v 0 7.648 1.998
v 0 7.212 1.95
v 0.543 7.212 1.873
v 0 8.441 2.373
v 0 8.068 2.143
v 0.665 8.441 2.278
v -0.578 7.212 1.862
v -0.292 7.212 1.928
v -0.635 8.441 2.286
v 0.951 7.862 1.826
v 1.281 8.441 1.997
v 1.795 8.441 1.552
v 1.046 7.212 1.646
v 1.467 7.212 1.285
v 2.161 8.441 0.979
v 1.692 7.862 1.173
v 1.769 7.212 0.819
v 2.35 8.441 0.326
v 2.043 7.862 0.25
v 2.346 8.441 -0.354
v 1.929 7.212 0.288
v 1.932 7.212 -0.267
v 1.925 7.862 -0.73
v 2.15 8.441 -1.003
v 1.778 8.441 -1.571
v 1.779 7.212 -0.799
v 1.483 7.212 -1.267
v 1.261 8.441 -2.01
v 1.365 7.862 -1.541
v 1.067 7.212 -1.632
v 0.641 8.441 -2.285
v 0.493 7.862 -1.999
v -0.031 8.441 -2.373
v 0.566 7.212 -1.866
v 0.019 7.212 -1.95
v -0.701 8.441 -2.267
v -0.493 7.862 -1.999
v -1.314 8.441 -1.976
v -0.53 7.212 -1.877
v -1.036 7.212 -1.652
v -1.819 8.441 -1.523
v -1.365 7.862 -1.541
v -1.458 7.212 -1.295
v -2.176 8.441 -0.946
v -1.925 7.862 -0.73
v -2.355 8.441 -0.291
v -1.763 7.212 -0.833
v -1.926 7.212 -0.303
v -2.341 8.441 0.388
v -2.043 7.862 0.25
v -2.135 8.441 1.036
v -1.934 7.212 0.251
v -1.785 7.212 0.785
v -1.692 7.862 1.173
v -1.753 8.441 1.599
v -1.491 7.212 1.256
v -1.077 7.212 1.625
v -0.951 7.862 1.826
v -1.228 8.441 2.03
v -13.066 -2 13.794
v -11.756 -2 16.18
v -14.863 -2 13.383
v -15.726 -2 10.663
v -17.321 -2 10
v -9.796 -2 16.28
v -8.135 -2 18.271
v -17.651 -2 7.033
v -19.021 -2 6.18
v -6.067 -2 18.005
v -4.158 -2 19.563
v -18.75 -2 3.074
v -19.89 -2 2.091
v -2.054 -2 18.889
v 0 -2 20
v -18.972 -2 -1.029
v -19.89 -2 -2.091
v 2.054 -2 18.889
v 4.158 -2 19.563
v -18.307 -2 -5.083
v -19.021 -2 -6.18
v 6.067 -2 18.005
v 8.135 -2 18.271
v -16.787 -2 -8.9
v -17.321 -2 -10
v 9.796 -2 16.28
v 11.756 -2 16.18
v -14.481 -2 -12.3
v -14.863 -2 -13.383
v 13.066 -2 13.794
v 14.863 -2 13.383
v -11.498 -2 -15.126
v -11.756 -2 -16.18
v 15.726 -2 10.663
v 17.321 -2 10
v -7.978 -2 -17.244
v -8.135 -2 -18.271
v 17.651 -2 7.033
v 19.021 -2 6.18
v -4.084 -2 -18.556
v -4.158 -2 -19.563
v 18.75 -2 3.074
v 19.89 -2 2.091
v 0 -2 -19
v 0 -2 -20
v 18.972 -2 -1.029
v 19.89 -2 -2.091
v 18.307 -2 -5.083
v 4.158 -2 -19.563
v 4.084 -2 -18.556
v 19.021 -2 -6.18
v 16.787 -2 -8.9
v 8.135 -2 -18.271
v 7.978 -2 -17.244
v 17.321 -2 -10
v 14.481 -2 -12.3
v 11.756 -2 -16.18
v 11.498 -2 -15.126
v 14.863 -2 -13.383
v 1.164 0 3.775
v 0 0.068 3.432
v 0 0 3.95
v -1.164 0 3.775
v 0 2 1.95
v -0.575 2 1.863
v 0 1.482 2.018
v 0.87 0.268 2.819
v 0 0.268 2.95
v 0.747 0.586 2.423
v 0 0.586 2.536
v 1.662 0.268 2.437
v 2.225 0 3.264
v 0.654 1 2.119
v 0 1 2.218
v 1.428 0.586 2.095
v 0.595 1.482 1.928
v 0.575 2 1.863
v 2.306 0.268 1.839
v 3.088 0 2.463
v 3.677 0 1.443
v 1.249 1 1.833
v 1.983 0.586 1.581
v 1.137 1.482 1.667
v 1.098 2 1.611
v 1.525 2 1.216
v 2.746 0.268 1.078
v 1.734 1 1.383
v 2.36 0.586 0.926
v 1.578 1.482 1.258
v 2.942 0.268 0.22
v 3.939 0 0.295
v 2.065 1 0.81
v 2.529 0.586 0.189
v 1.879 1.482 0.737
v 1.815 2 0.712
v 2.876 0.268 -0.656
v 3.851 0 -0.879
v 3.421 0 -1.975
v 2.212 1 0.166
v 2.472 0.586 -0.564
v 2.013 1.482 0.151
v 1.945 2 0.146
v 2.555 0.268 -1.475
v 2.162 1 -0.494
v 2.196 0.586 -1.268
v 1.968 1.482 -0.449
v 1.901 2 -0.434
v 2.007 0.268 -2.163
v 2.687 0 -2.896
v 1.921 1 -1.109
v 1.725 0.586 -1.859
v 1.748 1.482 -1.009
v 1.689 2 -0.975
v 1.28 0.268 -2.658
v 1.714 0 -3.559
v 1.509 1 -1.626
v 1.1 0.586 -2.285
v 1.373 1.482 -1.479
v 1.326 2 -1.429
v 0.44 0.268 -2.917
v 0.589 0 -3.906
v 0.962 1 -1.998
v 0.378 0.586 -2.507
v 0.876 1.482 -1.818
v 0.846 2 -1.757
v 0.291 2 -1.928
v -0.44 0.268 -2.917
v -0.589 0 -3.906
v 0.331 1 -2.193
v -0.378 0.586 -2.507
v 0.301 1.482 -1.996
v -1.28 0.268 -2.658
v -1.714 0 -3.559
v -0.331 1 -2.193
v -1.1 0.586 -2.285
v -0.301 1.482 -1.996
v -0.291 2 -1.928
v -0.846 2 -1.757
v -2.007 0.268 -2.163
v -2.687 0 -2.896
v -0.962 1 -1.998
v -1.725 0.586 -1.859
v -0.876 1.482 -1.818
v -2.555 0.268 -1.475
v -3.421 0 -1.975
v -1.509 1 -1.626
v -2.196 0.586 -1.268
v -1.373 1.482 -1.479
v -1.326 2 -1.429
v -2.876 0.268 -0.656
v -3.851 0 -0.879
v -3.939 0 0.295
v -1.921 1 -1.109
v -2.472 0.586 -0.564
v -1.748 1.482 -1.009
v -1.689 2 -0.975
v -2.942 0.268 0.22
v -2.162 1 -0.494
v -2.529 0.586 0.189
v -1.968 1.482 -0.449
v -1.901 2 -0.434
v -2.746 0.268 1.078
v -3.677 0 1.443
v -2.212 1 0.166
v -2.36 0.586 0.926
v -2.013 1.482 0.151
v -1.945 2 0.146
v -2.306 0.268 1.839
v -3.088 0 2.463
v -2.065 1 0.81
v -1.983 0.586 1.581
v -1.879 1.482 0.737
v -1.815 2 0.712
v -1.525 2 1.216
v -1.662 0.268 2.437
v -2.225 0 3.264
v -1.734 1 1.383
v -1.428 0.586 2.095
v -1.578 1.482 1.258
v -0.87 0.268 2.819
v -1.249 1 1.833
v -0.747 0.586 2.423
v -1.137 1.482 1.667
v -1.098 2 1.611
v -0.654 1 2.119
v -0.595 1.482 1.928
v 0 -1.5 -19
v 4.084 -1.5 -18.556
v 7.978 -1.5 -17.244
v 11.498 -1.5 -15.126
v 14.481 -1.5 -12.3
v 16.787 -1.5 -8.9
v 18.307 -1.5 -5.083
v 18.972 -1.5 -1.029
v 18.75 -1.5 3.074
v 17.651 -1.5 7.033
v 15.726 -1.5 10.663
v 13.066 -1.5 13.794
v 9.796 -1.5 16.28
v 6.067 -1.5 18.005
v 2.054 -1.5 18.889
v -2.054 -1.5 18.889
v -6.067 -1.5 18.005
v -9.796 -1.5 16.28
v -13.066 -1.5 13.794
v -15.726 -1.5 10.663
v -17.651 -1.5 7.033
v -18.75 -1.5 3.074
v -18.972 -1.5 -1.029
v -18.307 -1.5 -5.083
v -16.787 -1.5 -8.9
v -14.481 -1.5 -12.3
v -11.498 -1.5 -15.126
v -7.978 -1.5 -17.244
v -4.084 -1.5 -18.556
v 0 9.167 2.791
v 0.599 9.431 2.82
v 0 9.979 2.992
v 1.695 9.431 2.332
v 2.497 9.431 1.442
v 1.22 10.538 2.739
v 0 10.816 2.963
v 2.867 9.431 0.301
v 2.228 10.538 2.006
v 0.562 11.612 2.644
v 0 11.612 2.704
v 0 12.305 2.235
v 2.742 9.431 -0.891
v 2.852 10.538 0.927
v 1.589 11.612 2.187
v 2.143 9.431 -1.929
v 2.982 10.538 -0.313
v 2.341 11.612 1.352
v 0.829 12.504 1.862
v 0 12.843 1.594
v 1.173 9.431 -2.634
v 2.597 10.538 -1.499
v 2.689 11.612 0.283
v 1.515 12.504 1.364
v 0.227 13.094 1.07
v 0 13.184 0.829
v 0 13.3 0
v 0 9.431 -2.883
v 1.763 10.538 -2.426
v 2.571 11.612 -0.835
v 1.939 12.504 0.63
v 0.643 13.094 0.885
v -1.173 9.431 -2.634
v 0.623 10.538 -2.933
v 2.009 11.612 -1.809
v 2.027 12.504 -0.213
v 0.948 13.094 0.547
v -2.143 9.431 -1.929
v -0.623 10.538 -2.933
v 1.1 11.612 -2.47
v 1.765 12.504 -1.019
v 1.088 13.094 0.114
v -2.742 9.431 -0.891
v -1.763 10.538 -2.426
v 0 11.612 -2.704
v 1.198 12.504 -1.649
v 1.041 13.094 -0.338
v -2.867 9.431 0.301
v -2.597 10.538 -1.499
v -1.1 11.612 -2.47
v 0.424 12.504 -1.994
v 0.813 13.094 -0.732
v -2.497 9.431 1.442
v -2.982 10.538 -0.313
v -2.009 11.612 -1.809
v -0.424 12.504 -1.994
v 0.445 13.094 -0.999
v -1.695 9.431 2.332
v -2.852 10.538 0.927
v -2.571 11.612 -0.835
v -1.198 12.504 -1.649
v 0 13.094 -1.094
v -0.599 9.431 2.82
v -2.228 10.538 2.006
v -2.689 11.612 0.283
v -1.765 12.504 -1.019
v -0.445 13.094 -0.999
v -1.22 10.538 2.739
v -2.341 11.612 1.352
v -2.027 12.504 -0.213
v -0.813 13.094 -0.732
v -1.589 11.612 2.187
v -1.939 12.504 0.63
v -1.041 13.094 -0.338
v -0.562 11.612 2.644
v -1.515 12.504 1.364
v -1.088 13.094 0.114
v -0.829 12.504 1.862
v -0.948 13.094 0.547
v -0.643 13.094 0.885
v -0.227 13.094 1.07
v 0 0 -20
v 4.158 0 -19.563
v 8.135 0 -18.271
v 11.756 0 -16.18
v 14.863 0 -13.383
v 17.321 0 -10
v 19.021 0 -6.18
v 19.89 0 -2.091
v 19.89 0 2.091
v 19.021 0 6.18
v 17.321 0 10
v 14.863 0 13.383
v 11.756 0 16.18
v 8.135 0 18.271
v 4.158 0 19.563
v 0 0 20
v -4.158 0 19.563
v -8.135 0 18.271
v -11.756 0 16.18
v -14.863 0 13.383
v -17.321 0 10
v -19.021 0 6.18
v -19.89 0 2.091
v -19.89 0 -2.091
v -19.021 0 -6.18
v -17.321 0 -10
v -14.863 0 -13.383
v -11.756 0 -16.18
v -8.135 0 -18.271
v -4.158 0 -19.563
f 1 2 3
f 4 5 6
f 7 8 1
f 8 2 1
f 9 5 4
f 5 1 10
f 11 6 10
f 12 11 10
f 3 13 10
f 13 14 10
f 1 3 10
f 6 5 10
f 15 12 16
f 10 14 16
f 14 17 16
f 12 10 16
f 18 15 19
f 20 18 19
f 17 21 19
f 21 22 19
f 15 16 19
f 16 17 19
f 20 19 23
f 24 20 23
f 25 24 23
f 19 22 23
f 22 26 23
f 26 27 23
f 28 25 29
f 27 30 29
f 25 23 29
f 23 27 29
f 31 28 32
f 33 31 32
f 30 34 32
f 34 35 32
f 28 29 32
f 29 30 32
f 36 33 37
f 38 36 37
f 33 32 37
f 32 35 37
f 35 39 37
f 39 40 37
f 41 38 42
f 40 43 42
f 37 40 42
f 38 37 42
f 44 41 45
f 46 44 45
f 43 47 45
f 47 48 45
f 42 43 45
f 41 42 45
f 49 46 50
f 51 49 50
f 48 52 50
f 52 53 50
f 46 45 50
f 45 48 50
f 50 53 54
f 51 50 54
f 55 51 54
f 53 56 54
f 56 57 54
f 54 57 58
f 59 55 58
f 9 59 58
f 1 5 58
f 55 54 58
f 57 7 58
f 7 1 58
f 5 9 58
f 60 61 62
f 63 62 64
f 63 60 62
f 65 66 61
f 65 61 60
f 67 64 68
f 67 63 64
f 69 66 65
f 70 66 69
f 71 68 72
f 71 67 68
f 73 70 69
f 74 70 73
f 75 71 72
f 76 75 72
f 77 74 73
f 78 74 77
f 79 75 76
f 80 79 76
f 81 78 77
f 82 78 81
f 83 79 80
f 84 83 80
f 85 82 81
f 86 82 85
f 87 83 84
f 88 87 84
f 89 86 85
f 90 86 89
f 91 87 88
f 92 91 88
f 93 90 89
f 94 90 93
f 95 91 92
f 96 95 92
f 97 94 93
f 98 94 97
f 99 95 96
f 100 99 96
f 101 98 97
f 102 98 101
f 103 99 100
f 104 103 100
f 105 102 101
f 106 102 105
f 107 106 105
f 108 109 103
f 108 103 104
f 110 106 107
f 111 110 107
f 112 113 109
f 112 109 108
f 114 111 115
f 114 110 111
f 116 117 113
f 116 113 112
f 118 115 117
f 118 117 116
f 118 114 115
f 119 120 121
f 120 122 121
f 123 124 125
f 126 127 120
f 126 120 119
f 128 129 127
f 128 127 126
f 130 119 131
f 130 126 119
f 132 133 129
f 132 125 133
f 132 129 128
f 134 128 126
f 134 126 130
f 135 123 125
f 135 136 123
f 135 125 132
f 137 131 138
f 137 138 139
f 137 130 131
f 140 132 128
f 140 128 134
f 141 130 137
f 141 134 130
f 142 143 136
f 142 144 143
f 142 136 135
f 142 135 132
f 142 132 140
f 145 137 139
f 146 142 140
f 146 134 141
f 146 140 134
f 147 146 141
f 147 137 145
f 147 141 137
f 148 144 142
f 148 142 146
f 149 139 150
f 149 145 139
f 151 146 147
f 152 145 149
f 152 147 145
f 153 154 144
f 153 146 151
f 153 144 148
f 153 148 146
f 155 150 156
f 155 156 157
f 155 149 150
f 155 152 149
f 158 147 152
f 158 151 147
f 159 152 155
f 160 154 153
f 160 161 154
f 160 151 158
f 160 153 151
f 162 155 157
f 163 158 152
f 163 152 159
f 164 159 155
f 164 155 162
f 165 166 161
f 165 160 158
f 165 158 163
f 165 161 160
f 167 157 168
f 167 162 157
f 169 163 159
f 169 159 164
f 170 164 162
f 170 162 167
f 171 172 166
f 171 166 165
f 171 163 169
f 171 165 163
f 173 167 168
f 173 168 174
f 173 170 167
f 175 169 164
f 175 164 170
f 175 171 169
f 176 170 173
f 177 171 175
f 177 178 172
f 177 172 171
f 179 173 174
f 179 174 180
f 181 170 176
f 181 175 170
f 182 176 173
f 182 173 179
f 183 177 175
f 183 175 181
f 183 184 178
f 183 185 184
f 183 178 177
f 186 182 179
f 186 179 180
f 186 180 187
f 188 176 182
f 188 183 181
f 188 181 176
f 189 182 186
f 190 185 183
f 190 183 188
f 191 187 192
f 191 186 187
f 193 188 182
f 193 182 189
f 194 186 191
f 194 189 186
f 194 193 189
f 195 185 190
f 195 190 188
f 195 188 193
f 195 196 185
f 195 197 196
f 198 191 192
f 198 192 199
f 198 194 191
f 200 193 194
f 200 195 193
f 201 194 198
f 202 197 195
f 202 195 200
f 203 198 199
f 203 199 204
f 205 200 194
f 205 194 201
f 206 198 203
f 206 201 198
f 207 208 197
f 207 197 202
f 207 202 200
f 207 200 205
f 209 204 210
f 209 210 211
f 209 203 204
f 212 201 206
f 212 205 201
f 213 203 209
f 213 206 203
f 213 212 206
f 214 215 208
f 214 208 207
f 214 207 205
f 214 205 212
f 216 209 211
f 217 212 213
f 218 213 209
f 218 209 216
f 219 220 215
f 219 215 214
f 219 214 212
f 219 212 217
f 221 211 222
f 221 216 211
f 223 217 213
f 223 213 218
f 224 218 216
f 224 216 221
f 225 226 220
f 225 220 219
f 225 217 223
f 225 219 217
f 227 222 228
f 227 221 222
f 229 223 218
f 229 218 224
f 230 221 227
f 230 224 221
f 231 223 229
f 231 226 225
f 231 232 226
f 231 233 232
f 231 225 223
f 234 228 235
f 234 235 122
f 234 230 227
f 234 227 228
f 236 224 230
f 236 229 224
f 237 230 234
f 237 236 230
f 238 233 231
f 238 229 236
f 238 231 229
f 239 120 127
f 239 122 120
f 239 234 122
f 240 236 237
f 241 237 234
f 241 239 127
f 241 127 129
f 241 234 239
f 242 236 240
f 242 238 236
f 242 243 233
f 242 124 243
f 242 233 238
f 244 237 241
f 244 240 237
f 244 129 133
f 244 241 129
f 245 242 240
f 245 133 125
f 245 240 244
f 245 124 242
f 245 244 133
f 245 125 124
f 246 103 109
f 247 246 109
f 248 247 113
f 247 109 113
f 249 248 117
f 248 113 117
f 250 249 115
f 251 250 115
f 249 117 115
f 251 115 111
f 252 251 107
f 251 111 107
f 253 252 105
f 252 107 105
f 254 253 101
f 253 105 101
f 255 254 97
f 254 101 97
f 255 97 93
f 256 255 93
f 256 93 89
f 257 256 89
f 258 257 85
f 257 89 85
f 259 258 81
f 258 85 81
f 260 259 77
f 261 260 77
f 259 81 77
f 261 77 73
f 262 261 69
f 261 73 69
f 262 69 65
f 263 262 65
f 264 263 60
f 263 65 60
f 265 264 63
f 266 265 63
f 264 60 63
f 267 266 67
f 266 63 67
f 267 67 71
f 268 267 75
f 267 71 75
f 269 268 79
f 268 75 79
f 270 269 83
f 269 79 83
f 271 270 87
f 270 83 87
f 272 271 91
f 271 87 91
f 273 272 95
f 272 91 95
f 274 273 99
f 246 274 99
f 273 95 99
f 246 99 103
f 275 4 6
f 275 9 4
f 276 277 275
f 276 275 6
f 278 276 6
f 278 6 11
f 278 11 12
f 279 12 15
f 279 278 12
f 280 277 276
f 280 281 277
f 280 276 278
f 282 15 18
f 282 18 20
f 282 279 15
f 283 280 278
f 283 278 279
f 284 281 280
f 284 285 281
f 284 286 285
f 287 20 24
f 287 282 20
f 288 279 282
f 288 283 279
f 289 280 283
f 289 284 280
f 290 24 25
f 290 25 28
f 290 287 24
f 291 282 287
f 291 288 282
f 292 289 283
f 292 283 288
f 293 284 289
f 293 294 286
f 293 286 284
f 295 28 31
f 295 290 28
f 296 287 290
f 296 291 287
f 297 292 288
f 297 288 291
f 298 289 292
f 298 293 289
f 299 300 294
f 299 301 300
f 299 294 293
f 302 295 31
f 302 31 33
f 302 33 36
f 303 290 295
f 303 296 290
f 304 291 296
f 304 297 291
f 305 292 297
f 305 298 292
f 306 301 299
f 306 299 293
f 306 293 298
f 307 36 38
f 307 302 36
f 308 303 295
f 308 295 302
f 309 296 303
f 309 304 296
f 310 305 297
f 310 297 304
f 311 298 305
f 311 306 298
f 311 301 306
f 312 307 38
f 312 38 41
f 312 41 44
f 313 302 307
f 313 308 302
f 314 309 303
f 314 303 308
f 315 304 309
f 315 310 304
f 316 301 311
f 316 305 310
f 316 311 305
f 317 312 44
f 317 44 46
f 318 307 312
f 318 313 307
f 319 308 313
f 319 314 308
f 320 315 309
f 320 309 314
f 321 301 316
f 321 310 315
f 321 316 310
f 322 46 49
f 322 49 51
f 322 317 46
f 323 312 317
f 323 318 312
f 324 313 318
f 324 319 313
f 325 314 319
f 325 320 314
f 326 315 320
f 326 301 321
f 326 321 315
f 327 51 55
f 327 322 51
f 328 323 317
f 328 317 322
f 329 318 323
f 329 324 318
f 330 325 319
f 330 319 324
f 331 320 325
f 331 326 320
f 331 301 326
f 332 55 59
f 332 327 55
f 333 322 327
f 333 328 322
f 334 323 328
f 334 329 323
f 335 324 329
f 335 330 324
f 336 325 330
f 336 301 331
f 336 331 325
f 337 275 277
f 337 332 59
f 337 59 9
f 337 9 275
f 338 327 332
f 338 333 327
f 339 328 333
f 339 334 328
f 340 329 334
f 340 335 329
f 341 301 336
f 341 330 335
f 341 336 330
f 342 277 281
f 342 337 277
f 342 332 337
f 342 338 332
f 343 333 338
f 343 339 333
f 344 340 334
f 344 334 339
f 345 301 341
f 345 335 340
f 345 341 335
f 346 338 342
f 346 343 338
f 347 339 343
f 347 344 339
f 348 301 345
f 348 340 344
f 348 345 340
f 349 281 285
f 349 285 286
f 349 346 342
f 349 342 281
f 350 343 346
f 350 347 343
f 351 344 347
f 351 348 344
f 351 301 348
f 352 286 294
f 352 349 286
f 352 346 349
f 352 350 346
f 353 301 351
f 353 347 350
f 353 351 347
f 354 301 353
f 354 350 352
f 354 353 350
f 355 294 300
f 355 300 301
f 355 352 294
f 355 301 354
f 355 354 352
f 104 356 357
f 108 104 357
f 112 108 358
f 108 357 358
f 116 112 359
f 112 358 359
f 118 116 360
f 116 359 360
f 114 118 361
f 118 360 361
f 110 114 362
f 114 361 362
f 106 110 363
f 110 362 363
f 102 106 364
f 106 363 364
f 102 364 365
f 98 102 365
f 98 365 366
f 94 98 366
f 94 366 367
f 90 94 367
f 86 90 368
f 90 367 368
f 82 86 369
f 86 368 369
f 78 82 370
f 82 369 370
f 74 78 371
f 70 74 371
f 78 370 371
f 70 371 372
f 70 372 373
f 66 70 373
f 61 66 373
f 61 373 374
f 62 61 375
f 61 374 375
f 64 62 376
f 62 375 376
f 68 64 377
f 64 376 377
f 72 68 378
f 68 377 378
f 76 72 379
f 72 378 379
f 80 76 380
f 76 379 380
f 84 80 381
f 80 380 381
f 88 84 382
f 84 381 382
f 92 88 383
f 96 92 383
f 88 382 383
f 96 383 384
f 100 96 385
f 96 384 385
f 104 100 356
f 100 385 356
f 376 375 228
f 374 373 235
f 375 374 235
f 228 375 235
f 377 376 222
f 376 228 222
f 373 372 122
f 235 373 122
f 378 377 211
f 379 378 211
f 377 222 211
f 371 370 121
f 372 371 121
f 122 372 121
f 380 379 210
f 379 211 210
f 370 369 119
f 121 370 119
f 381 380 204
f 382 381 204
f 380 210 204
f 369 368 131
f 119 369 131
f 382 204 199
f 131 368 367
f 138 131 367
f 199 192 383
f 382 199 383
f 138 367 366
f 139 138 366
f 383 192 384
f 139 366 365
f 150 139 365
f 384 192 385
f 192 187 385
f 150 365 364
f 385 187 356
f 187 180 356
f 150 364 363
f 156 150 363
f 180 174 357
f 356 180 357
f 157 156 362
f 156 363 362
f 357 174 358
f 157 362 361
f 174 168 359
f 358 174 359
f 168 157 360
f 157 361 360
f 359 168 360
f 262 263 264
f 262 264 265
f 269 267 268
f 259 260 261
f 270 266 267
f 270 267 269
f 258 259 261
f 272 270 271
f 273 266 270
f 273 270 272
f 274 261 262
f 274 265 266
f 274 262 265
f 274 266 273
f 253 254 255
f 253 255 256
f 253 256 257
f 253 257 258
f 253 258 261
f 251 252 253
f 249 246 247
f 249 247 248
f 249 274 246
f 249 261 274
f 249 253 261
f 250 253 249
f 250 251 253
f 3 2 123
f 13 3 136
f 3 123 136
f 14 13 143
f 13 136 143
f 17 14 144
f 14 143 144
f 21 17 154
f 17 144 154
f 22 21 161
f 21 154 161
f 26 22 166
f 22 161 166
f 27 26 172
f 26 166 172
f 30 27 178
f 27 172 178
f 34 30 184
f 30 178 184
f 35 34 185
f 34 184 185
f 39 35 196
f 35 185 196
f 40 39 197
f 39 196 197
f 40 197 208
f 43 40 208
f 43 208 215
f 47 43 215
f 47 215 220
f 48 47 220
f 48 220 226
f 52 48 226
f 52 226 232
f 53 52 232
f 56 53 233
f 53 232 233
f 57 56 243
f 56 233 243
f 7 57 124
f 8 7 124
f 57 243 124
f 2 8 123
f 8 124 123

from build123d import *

# Parameters (mm, degrees)
CROQUIS2_R              = 1.95
SALIENTE_EXTRUIR1_DEPTH = 8
C_PULA1_FACE_RADIUS     = 1.95
C_PULA1_HEIGHT          = 5.3
CROQUIS15_R             = 20
SALIENTE_EXTRUIR2_DEPTH = 2
FILLET1_R               = 2
SKETCH1_R               = 19
CUT_EXTRUDE1_DEPTH      = 0.5


with BuildPart() as part:
    # Croquis2 → Saliente-Extruir1 (new body)
    with BuildSketch(Plane(origin=(0, 0, 0), x_dir=(1, 0, 0), z_dir=(0, 1, 0))):
        with Locations(Location((0, 0, 0), (0, 0, 270))):
            Circle(CROQUIS2_R)
    extrude(amount=SALIENTE_EXTRUIR1_DEPTH)

    # Cúpula1: a dome of height H over a round flat face of radius A is a cap of a sphere of radius (A * A + H * H) / (2 * H)
    c_pula1_r = (C_PULA1_FACE_RADIUS * C_PULA1_FACE_RADIUS + C_PULA1_HEIGHT * C_PULA1_HEIGHT) / (2 * C_PULA1_HEIGHT)
    c_pula1_base = Plane((0, 8, 0), z_dir=(0, 1, 0))
    with Locations(c_pula1_base.offset(C_PULA1_HEIGHT - c_pula1_r)):
        c_pula1_ball = Sphere(c_pula1_r, mode=Mode.PRIVATE)
    add(split(c_pula1_ball, bisect_by=c_pula1_base, keep=Keep.TOP, mode=Mode.PRIVATE))

    # Croquis15 → Saliente-Extruir2 (add)
    with BuildSketch(Plane(origin=(0, 0, 0), x_dir=(-1, 0, 0), z_dir=(0, -1, 0))):
        with Locations(Location((0, 0, 0), (0, 0, 90))):
            Circle(CROQUIS15_R)
    extrude(amount=SALIENTE_EXTRUIR2_DEPTH)

    # Fillet1
    fillet1_edges = [part.edges().sort_by_distance(p)[0] for p in [
        (0, 8, -1.95),
        (0, 0, -1.95),
    ]]
    fillet(fillet1_edges, radius=FILLET1_R)

    # Sketch1 → Cut-Extrude1 (cut)
    with BuildSketch(Plane.XZ.offset(2)):
        with Locations(Location((0, 0, 0), (0, 0, 270))):
            Circle(SKETCH1_R)
    extrude(amount=-CUT_EXTRUDE1_DEPTH, mode=Mode.SUBTRACT)


solid = part.part
